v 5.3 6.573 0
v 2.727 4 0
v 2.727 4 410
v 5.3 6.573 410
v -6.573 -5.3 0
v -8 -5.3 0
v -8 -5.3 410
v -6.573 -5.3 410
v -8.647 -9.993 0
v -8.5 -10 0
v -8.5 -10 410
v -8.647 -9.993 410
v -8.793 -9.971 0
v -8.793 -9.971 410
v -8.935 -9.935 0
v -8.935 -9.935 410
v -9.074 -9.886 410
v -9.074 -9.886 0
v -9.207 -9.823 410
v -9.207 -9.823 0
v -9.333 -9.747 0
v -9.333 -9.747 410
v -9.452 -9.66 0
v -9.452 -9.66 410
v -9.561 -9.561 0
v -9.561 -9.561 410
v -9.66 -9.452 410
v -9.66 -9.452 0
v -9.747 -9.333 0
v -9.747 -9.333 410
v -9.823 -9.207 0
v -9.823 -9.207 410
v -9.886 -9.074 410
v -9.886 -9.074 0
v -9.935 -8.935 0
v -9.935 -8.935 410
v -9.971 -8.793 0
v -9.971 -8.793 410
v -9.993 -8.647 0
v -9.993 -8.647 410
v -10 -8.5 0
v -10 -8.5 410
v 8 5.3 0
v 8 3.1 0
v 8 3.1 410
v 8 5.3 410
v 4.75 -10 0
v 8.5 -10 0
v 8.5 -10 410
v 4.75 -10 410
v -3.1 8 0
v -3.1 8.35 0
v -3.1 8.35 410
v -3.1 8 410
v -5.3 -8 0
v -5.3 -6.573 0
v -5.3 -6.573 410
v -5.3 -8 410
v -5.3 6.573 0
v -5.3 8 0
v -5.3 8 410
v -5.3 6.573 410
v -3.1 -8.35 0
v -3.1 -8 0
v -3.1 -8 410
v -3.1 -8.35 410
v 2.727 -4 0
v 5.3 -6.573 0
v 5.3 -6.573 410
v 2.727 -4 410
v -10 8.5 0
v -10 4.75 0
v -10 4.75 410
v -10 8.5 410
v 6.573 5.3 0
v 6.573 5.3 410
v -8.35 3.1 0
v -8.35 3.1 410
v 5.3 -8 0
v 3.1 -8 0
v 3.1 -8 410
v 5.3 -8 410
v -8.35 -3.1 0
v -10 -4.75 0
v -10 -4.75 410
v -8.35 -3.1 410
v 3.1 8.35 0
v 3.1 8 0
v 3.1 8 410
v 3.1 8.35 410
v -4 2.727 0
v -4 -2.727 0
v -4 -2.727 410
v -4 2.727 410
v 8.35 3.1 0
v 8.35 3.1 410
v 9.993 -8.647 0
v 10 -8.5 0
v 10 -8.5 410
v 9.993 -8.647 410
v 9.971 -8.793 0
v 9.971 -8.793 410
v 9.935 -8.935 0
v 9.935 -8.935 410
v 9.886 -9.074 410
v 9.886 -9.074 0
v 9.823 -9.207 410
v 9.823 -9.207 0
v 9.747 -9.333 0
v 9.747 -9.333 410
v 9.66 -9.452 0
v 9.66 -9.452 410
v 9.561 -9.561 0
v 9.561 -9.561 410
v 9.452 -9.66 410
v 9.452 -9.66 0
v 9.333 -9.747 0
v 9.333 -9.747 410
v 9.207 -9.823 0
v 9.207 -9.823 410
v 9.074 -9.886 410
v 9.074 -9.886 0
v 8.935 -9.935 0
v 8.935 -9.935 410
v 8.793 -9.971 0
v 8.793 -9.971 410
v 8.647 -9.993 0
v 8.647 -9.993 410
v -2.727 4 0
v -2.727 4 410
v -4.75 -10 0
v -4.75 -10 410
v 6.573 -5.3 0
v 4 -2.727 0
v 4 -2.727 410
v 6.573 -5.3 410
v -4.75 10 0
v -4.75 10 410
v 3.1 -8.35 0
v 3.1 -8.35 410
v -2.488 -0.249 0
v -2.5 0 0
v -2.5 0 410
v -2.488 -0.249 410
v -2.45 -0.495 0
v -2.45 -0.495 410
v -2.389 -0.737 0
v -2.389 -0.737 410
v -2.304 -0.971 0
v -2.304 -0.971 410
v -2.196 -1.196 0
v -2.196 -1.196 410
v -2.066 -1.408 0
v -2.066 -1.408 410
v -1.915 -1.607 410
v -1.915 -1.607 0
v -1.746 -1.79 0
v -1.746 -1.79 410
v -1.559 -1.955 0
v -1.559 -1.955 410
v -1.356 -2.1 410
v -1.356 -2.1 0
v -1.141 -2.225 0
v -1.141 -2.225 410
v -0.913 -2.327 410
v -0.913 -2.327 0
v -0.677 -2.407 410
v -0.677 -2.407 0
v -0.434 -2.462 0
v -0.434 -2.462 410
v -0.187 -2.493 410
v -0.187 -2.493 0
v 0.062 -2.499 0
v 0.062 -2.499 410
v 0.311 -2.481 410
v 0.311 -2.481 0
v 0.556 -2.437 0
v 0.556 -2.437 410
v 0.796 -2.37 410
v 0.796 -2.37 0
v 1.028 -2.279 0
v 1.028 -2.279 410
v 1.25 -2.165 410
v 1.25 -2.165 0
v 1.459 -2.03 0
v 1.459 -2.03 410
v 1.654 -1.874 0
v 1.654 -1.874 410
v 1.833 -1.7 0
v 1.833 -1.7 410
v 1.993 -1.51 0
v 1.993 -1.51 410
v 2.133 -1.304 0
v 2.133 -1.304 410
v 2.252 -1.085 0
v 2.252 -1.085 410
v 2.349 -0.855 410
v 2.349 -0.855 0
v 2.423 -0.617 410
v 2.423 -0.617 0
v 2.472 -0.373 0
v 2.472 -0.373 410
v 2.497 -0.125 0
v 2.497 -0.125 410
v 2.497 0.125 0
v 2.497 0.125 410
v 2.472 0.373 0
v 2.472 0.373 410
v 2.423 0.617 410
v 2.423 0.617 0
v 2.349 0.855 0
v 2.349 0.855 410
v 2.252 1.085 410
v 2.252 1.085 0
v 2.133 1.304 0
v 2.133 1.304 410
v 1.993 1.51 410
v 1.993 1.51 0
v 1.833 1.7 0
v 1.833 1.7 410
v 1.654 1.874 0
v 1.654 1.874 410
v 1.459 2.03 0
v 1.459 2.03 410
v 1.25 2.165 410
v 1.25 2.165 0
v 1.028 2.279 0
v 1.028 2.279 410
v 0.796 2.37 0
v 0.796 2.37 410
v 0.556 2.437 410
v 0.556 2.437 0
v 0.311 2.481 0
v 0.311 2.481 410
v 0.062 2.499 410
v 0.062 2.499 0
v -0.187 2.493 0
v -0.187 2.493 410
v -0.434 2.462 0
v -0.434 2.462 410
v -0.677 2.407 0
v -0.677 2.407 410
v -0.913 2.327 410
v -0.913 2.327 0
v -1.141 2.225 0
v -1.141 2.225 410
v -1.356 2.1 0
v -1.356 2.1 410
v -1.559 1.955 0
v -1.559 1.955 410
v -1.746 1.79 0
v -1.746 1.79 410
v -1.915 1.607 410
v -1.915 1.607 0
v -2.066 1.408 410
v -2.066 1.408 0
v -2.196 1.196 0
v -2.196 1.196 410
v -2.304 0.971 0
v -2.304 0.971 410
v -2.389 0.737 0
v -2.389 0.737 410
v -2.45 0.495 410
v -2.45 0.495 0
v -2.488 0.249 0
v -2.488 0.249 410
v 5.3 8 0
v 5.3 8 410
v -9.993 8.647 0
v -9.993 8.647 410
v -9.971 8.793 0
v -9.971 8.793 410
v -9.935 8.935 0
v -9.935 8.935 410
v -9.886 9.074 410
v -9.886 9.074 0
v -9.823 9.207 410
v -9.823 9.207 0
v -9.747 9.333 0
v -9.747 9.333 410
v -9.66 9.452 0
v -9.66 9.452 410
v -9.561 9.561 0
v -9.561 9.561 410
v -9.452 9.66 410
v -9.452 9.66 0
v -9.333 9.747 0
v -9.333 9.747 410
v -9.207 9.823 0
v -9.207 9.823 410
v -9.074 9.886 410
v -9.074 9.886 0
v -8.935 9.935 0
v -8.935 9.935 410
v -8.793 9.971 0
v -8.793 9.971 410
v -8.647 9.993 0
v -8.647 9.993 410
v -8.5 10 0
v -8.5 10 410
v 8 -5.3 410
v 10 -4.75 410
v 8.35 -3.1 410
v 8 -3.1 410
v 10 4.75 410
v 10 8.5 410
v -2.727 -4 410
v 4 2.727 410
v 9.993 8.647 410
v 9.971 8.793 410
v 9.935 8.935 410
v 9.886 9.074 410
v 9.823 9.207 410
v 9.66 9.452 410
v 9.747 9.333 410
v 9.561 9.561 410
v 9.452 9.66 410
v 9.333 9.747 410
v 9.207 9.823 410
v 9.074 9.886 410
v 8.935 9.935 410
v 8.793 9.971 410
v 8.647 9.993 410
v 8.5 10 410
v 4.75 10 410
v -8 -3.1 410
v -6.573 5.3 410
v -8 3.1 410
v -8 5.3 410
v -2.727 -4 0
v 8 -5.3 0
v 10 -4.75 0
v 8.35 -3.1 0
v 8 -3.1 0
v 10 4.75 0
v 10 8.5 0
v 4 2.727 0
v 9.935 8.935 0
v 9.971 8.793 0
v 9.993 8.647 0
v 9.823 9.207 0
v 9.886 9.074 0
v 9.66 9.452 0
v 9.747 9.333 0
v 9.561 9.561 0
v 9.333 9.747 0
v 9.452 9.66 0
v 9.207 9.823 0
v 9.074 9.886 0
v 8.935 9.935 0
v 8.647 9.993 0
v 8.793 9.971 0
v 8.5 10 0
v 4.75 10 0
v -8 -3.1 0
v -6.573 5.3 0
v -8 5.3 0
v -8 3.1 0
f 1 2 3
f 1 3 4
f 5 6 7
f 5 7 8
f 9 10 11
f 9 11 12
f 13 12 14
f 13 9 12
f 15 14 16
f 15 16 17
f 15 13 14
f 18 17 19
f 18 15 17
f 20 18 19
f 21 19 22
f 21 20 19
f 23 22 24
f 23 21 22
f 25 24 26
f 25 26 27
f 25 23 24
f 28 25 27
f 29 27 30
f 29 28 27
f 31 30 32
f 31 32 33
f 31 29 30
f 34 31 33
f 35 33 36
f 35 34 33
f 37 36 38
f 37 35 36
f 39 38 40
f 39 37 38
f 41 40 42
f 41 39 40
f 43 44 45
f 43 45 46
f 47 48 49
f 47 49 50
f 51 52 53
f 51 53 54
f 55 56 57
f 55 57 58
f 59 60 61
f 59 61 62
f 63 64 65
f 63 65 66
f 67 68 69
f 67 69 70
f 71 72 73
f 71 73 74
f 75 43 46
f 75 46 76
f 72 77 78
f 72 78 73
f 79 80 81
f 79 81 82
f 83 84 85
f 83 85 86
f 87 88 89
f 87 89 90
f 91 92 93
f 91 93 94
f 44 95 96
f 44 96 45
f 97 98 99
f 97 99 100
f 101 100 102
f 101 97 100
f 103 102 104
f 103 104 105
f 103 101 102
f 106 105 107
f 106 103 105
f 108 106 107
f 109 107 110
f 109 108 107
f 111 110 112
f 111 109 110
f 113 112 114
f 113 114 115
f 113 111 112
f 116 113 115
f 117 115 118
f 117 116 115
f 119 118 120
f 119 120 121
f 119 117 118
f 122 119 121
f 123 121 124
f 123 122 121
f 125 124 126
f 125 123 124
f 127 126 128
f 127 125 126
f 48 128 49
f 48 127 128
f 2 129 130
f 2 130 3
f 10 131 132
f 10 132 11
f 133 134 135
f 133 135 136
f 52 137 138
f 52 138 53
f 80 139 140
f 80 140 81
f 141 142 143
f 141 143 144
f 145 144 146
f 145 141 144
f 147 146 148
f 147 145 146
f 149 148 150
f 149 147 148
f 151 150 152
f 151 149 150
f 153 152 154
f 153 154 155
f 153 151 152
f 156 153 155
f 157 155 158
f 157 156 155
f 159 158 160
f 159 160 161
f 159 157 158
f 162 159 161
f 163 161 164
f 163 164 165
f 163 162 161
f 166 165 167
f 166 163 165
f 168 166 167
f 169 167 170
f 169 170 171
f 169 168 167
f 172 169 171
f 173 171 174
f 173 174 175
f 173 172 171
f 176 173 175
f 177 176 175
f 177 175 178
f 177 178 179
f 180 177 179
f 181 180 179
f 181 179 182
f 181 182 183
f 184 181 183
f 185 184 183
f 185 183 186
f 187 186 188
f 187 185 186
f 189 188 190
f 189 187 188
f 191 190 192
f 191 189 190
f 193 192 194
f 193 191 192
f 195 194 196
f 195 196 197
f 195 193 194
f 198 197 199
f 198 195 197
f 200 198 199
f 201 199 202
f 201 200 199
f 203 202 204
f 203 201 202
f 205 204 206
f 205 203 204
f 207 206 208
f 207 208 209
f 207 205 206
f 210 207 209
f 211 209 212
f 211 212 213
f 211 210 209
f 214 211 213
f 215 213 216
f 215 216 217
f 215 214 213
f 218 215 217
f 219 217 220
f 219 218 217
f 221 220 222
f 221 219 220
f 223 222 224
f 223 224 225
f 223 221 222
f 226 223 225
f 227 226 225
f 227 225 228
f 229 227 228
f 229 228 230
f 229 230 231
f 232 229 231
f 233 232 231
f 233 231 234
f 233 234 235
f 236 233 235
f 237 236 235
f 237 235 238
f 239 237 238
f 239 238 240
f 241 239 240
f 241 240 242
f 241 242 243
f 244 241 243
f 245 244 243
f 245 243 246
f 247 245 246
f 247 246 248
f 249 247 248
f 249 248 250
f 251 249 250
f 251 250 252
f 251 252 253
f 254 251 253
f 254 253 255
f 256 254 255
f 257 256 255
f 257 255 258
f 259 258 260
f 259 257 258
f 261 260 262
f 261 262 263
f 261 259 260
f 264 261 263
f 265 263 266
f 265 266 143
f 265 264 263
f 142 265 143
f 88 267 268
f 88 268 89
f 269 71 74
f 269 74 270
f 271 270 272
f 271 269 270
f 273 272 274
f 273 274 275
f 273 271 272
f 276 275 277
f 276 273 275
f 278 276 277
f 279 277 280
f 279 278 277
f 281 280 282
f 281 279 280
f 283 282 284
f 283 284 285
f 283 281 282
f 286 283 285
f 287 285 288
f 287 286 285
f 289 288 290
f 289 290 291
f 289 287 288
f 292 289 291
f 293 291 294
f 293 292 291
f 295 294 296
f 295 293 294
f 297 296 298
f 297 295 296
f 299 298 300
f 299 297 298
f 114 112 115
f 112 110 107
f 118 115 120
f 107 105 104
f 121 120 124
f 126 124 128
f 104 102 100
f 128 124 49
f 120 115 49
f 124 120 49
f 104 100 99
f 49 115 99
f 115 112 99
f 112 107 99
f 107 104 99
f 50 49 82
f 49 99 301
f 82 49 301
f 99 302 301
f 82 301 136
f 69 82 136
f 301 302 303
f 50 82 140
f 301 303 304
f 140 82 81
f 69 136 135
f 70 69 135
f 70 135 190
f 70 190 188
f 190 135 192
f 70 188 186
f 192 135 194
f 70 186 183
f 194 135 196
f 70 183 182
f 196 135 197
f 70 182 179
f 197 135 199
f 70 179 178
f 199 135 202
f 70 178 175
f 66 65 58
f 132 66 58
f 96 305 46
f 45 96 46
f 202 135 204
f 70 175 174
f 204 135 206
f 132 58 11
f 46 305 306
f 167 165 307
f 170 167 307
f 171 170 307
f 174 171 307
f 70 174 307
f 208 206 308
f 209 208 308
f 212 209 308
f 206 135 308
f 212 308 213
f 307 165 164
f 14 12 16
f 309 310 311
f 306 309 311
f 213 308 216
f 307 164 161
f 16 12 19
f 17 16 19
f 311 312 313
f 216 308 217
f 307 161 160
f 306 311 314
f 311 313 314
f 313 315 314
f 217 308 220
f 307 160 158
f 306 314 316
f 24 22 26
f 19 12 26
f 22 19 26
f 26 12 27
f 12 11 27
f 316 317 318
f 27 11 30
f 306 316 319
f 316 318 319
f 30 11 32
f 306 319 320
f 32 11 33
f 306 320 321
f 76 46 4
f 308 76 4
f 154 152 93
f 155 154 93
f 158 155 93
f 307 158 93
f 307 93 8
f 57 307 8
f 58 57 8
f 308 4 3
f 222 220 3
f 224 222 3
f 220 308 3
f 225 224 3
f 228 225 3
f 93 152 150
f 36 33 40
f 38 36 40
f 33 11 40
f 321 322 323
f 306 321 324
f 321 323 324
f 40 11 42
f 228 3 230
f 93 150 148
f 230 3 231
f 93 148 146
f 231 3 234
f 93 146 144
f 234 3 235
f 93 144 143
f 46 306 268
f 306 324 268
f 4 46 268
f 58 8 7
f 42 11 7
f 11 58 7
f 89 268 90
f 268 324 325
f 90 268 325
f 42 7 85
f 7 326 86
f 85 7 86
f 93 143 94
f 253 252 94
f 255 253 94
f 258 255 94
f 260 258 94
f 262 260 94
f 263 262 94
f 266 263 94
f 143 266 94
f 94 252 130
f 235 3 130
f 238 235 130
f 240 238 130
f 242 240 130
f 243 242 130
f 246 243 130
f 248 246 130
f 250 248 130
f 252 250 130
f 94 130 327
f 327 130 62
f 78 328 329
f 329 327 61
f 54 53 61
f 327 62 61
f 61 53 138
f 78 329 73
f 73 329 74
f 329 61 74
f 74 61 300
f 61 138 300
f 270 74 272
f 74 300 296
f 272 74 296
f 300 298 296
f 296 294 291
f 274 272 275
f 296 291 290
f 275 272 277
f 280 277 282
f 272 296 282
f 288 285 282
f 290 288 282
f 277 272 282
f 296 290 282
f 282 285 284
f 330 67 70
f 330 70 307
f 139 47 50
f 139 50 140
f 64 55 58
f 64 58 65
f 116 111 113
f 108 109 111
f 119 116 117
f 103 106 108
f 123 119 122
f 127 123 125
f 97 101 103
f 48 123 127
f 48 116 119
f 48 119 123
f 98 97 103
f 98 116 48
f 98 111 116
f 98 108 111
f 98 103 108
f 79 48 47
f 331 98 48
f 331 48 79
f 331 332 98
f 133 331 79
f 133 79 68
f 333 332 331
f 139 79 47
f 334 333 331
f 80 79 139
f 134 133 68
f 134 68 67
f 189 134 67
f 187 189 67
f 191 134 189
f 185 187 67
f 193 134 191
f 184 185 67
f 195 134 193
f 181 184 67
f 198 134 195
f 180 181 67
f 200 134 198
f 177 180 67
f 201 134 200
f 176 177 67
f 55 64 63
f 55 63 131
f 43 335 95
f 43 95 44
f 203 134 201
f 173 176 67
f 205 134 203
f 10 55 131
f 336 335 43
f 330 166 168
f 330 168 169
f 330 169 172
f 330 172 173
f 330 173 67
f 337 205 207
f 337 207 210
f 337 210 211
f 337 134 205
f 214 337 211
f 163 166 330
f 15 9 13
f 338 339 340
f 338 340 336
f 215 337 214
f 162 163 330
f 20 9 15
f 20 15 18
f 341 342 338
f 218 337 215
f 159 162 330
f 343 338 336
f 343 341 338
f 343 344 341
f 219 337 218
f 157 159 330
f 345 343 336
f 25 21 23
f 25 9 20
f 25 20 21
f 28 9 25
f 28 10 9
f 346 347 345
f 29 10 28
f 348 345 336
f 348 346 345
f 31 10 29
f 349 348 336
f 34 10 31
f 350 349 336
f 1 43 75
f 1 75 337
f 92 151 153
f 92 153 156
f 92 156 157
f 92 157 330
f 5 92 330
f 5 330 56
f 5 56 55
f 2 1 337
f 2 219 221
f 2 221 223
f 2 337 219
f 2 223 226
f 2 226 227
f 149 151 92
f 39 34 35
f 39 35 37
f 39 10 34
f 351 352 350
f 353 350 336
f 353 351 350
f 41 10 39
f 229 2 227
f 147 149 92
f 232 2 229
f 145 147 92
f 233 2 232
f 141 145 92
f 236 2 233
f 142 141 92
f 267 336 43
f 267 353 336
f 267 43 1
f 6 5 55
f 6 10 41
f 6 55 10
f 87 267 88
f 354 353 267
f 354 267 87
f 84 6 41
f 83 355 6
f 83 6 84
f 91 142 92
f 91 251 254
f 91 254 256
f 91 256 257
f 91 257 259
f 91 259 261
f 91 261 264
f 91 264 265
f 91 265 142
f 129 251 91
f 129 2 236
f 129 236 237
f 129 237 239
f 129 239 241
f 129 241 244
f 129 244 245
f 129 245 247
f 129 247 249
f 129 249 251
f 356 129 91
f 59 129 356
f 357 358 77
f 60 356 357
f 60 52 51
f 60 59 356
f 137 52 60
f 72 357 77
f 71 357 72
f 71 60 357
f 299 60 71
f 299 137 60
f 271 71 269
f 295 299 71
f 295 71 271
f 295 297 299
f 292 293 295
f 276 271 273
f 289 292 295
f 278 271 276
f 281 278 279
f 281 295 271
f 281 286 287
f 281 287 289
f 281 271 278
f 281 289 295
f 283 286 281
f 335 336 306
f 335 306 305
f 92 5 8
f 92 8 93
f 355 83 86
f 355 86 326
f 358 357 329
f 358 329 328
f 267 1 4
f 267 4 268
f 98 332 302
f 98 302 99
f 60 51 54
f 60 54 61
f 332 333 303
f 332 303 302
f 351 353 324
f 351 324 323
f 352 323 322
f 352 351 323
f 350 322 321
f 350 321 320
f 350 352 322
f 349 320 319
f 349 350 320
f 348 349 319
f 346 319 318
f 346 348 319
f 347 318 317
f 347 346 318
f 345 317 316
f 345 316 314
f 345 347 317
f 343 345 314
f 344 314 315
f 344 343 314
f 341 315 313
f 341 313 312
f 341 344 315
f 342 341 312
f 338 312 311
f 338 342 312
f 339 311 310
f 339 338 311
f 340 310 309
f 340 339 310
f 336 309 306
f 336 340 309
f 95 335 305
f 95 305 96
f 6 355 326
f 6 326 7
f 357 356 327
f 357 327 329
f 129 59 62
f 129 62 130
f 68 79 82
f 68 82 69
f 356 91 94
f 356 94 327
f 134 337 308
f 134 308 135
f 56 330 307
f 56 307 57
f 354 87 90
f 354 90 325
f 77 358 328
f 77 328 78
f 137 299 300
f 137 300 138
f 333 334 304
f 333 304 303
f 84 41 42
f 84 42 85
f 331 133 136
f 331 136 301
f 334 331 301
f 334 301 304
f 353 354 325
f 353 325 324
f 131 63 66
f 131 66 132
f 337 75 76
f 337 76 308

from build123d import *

# Parameters (mm, degrees)
SKETCH2_R           = 2.5
BOSS_EXTRUDE1_DEPTH = 410


with BuildPart() as part:
    # Sketch2 → Boss-Extrude1 (new body)
    with BuildSketch(Plane.XY):
        with BuildLine():
            Line((-4, -2.727207794), (-4, 2.727207794))
            Line((-4, 2.727207794), (-6.572792206, 5.3))
            Line((-6.572792206, 5.3), (-8, 5.3))
            Line((-8, 5.3), (-8, 3.1))
            Line((-8, 3.1), (-8.35, 3.1))
            Line((-8.35, 3.1), (-10, 4.75))
            Line((-10, 4.75), (-10, 8.5))
            ThreePointArc((-10, 8.5), (-9.560660172, 9.560660172), (-8.5, 10))
            Line((-8.5, 10), (-4.75, 10))
            Line((-4.75, 10), (-3.1, 8.35))
            Line((-3.1, 8.35), (-3.1, 8))
            Line((-3.1, 8), (-5.3, 8))
            Line((-5.3, 8), (-5.3, 6.572792206))
            Line((-5.3, 6.572792206), (-2.727207794, 4))
            Line((-2.727207794, 4), (2.727207794, 4))
            Line((2.727207794, 4), (5.3, 6.572792206))
            Line((5.3, 6.572792206), (5.3, 8))
            Line((5.3, 8), (3.1, 8))
            Line((3.1, 8), (3.1, 8.35))
            Line((3.1, 8.35), (4.75, 10))
            Line((4.75, 10), (8.5, 10))
            ThreePointArc((8.5, 10), (9.560660172, 9.560660172), (10, 8.5))
            Line((10, 8.5), (10, 4.75))
            Line((10, 4.75), (8.35, 3.1))
            Line((8.35, 3.1), (8, 3.1))
            Line((8, 3.1), (8, 5.3))
            Line((8, 5.3), (6.572792206, 5.3))
            Line((6.572792206, 5.3), (4, 2.727207794))
            Line((4, 2.727207794), (4, -2.727207794))
            Line((4, -2.727207794), (6.572792206, -5.3))
            Line((6.572792206, -5.3), (8, -5.3))
            Line((8, -5.3), (8, -3.1))
            Line((8, -3.1), (8.35, -3.1))
            Line((8.35, -3.1), (10, -4.75))
            Line((10, -4.75), (10, -8.5))
            ThreePointArc((10, -8.5), (9.560660172, -9.560660172), (8.5, -10))
            Line((8.5, -10), (4.75, -10))
            Line((4.75, -10), (3.1, -8.35))
            Line((3.1, -8.35), (3.1, -8))
            Line((3.1, -8), (5.3, -8))
            Line((5.3, -8), (5.3, -6.572792206))
            Line((5.3, -6.572792206), (2.727207794, -4))
            Line((2.727207794, -4), (-2.727207794, -4))
            Line((-2.727207794, -4), (-5.3, -6.572792206))
            Line((-5.3, -6.572792206), (-5.3, -8))
            Line((-5.3, -8), (-3.1, -8))
            Line((-3.1, -8), (-3.1, -8.35))
            Line((-3.1, -8.35), (-4.75, -10))
            Line((-4.75, -10), (-8.5, -10))
            ThreePointArc((-8.5, -10), (-9.560660172, -9.560660172), (-10, -8.5))
            Line((-10, -8.5), (-10, -4.75))
            Line((-10, -4.75), (-8.35, -3.1))
            Line((-8.35, -3.1), (-8, -3.1))
            Line((-8, -3.1), (-8, -5.3))
            Line((-8, -5.3), (-6.572792206, -5.3))
            Line((-6.572792206, -5.3), (-4, -2.727207794))
        make_face()
        Circle(SKETCH2_R, mode=Mode.SUBTRACT)
    extrude(amount=BOSS_EXTRUDE1_DEPTH)


solid = part.part
